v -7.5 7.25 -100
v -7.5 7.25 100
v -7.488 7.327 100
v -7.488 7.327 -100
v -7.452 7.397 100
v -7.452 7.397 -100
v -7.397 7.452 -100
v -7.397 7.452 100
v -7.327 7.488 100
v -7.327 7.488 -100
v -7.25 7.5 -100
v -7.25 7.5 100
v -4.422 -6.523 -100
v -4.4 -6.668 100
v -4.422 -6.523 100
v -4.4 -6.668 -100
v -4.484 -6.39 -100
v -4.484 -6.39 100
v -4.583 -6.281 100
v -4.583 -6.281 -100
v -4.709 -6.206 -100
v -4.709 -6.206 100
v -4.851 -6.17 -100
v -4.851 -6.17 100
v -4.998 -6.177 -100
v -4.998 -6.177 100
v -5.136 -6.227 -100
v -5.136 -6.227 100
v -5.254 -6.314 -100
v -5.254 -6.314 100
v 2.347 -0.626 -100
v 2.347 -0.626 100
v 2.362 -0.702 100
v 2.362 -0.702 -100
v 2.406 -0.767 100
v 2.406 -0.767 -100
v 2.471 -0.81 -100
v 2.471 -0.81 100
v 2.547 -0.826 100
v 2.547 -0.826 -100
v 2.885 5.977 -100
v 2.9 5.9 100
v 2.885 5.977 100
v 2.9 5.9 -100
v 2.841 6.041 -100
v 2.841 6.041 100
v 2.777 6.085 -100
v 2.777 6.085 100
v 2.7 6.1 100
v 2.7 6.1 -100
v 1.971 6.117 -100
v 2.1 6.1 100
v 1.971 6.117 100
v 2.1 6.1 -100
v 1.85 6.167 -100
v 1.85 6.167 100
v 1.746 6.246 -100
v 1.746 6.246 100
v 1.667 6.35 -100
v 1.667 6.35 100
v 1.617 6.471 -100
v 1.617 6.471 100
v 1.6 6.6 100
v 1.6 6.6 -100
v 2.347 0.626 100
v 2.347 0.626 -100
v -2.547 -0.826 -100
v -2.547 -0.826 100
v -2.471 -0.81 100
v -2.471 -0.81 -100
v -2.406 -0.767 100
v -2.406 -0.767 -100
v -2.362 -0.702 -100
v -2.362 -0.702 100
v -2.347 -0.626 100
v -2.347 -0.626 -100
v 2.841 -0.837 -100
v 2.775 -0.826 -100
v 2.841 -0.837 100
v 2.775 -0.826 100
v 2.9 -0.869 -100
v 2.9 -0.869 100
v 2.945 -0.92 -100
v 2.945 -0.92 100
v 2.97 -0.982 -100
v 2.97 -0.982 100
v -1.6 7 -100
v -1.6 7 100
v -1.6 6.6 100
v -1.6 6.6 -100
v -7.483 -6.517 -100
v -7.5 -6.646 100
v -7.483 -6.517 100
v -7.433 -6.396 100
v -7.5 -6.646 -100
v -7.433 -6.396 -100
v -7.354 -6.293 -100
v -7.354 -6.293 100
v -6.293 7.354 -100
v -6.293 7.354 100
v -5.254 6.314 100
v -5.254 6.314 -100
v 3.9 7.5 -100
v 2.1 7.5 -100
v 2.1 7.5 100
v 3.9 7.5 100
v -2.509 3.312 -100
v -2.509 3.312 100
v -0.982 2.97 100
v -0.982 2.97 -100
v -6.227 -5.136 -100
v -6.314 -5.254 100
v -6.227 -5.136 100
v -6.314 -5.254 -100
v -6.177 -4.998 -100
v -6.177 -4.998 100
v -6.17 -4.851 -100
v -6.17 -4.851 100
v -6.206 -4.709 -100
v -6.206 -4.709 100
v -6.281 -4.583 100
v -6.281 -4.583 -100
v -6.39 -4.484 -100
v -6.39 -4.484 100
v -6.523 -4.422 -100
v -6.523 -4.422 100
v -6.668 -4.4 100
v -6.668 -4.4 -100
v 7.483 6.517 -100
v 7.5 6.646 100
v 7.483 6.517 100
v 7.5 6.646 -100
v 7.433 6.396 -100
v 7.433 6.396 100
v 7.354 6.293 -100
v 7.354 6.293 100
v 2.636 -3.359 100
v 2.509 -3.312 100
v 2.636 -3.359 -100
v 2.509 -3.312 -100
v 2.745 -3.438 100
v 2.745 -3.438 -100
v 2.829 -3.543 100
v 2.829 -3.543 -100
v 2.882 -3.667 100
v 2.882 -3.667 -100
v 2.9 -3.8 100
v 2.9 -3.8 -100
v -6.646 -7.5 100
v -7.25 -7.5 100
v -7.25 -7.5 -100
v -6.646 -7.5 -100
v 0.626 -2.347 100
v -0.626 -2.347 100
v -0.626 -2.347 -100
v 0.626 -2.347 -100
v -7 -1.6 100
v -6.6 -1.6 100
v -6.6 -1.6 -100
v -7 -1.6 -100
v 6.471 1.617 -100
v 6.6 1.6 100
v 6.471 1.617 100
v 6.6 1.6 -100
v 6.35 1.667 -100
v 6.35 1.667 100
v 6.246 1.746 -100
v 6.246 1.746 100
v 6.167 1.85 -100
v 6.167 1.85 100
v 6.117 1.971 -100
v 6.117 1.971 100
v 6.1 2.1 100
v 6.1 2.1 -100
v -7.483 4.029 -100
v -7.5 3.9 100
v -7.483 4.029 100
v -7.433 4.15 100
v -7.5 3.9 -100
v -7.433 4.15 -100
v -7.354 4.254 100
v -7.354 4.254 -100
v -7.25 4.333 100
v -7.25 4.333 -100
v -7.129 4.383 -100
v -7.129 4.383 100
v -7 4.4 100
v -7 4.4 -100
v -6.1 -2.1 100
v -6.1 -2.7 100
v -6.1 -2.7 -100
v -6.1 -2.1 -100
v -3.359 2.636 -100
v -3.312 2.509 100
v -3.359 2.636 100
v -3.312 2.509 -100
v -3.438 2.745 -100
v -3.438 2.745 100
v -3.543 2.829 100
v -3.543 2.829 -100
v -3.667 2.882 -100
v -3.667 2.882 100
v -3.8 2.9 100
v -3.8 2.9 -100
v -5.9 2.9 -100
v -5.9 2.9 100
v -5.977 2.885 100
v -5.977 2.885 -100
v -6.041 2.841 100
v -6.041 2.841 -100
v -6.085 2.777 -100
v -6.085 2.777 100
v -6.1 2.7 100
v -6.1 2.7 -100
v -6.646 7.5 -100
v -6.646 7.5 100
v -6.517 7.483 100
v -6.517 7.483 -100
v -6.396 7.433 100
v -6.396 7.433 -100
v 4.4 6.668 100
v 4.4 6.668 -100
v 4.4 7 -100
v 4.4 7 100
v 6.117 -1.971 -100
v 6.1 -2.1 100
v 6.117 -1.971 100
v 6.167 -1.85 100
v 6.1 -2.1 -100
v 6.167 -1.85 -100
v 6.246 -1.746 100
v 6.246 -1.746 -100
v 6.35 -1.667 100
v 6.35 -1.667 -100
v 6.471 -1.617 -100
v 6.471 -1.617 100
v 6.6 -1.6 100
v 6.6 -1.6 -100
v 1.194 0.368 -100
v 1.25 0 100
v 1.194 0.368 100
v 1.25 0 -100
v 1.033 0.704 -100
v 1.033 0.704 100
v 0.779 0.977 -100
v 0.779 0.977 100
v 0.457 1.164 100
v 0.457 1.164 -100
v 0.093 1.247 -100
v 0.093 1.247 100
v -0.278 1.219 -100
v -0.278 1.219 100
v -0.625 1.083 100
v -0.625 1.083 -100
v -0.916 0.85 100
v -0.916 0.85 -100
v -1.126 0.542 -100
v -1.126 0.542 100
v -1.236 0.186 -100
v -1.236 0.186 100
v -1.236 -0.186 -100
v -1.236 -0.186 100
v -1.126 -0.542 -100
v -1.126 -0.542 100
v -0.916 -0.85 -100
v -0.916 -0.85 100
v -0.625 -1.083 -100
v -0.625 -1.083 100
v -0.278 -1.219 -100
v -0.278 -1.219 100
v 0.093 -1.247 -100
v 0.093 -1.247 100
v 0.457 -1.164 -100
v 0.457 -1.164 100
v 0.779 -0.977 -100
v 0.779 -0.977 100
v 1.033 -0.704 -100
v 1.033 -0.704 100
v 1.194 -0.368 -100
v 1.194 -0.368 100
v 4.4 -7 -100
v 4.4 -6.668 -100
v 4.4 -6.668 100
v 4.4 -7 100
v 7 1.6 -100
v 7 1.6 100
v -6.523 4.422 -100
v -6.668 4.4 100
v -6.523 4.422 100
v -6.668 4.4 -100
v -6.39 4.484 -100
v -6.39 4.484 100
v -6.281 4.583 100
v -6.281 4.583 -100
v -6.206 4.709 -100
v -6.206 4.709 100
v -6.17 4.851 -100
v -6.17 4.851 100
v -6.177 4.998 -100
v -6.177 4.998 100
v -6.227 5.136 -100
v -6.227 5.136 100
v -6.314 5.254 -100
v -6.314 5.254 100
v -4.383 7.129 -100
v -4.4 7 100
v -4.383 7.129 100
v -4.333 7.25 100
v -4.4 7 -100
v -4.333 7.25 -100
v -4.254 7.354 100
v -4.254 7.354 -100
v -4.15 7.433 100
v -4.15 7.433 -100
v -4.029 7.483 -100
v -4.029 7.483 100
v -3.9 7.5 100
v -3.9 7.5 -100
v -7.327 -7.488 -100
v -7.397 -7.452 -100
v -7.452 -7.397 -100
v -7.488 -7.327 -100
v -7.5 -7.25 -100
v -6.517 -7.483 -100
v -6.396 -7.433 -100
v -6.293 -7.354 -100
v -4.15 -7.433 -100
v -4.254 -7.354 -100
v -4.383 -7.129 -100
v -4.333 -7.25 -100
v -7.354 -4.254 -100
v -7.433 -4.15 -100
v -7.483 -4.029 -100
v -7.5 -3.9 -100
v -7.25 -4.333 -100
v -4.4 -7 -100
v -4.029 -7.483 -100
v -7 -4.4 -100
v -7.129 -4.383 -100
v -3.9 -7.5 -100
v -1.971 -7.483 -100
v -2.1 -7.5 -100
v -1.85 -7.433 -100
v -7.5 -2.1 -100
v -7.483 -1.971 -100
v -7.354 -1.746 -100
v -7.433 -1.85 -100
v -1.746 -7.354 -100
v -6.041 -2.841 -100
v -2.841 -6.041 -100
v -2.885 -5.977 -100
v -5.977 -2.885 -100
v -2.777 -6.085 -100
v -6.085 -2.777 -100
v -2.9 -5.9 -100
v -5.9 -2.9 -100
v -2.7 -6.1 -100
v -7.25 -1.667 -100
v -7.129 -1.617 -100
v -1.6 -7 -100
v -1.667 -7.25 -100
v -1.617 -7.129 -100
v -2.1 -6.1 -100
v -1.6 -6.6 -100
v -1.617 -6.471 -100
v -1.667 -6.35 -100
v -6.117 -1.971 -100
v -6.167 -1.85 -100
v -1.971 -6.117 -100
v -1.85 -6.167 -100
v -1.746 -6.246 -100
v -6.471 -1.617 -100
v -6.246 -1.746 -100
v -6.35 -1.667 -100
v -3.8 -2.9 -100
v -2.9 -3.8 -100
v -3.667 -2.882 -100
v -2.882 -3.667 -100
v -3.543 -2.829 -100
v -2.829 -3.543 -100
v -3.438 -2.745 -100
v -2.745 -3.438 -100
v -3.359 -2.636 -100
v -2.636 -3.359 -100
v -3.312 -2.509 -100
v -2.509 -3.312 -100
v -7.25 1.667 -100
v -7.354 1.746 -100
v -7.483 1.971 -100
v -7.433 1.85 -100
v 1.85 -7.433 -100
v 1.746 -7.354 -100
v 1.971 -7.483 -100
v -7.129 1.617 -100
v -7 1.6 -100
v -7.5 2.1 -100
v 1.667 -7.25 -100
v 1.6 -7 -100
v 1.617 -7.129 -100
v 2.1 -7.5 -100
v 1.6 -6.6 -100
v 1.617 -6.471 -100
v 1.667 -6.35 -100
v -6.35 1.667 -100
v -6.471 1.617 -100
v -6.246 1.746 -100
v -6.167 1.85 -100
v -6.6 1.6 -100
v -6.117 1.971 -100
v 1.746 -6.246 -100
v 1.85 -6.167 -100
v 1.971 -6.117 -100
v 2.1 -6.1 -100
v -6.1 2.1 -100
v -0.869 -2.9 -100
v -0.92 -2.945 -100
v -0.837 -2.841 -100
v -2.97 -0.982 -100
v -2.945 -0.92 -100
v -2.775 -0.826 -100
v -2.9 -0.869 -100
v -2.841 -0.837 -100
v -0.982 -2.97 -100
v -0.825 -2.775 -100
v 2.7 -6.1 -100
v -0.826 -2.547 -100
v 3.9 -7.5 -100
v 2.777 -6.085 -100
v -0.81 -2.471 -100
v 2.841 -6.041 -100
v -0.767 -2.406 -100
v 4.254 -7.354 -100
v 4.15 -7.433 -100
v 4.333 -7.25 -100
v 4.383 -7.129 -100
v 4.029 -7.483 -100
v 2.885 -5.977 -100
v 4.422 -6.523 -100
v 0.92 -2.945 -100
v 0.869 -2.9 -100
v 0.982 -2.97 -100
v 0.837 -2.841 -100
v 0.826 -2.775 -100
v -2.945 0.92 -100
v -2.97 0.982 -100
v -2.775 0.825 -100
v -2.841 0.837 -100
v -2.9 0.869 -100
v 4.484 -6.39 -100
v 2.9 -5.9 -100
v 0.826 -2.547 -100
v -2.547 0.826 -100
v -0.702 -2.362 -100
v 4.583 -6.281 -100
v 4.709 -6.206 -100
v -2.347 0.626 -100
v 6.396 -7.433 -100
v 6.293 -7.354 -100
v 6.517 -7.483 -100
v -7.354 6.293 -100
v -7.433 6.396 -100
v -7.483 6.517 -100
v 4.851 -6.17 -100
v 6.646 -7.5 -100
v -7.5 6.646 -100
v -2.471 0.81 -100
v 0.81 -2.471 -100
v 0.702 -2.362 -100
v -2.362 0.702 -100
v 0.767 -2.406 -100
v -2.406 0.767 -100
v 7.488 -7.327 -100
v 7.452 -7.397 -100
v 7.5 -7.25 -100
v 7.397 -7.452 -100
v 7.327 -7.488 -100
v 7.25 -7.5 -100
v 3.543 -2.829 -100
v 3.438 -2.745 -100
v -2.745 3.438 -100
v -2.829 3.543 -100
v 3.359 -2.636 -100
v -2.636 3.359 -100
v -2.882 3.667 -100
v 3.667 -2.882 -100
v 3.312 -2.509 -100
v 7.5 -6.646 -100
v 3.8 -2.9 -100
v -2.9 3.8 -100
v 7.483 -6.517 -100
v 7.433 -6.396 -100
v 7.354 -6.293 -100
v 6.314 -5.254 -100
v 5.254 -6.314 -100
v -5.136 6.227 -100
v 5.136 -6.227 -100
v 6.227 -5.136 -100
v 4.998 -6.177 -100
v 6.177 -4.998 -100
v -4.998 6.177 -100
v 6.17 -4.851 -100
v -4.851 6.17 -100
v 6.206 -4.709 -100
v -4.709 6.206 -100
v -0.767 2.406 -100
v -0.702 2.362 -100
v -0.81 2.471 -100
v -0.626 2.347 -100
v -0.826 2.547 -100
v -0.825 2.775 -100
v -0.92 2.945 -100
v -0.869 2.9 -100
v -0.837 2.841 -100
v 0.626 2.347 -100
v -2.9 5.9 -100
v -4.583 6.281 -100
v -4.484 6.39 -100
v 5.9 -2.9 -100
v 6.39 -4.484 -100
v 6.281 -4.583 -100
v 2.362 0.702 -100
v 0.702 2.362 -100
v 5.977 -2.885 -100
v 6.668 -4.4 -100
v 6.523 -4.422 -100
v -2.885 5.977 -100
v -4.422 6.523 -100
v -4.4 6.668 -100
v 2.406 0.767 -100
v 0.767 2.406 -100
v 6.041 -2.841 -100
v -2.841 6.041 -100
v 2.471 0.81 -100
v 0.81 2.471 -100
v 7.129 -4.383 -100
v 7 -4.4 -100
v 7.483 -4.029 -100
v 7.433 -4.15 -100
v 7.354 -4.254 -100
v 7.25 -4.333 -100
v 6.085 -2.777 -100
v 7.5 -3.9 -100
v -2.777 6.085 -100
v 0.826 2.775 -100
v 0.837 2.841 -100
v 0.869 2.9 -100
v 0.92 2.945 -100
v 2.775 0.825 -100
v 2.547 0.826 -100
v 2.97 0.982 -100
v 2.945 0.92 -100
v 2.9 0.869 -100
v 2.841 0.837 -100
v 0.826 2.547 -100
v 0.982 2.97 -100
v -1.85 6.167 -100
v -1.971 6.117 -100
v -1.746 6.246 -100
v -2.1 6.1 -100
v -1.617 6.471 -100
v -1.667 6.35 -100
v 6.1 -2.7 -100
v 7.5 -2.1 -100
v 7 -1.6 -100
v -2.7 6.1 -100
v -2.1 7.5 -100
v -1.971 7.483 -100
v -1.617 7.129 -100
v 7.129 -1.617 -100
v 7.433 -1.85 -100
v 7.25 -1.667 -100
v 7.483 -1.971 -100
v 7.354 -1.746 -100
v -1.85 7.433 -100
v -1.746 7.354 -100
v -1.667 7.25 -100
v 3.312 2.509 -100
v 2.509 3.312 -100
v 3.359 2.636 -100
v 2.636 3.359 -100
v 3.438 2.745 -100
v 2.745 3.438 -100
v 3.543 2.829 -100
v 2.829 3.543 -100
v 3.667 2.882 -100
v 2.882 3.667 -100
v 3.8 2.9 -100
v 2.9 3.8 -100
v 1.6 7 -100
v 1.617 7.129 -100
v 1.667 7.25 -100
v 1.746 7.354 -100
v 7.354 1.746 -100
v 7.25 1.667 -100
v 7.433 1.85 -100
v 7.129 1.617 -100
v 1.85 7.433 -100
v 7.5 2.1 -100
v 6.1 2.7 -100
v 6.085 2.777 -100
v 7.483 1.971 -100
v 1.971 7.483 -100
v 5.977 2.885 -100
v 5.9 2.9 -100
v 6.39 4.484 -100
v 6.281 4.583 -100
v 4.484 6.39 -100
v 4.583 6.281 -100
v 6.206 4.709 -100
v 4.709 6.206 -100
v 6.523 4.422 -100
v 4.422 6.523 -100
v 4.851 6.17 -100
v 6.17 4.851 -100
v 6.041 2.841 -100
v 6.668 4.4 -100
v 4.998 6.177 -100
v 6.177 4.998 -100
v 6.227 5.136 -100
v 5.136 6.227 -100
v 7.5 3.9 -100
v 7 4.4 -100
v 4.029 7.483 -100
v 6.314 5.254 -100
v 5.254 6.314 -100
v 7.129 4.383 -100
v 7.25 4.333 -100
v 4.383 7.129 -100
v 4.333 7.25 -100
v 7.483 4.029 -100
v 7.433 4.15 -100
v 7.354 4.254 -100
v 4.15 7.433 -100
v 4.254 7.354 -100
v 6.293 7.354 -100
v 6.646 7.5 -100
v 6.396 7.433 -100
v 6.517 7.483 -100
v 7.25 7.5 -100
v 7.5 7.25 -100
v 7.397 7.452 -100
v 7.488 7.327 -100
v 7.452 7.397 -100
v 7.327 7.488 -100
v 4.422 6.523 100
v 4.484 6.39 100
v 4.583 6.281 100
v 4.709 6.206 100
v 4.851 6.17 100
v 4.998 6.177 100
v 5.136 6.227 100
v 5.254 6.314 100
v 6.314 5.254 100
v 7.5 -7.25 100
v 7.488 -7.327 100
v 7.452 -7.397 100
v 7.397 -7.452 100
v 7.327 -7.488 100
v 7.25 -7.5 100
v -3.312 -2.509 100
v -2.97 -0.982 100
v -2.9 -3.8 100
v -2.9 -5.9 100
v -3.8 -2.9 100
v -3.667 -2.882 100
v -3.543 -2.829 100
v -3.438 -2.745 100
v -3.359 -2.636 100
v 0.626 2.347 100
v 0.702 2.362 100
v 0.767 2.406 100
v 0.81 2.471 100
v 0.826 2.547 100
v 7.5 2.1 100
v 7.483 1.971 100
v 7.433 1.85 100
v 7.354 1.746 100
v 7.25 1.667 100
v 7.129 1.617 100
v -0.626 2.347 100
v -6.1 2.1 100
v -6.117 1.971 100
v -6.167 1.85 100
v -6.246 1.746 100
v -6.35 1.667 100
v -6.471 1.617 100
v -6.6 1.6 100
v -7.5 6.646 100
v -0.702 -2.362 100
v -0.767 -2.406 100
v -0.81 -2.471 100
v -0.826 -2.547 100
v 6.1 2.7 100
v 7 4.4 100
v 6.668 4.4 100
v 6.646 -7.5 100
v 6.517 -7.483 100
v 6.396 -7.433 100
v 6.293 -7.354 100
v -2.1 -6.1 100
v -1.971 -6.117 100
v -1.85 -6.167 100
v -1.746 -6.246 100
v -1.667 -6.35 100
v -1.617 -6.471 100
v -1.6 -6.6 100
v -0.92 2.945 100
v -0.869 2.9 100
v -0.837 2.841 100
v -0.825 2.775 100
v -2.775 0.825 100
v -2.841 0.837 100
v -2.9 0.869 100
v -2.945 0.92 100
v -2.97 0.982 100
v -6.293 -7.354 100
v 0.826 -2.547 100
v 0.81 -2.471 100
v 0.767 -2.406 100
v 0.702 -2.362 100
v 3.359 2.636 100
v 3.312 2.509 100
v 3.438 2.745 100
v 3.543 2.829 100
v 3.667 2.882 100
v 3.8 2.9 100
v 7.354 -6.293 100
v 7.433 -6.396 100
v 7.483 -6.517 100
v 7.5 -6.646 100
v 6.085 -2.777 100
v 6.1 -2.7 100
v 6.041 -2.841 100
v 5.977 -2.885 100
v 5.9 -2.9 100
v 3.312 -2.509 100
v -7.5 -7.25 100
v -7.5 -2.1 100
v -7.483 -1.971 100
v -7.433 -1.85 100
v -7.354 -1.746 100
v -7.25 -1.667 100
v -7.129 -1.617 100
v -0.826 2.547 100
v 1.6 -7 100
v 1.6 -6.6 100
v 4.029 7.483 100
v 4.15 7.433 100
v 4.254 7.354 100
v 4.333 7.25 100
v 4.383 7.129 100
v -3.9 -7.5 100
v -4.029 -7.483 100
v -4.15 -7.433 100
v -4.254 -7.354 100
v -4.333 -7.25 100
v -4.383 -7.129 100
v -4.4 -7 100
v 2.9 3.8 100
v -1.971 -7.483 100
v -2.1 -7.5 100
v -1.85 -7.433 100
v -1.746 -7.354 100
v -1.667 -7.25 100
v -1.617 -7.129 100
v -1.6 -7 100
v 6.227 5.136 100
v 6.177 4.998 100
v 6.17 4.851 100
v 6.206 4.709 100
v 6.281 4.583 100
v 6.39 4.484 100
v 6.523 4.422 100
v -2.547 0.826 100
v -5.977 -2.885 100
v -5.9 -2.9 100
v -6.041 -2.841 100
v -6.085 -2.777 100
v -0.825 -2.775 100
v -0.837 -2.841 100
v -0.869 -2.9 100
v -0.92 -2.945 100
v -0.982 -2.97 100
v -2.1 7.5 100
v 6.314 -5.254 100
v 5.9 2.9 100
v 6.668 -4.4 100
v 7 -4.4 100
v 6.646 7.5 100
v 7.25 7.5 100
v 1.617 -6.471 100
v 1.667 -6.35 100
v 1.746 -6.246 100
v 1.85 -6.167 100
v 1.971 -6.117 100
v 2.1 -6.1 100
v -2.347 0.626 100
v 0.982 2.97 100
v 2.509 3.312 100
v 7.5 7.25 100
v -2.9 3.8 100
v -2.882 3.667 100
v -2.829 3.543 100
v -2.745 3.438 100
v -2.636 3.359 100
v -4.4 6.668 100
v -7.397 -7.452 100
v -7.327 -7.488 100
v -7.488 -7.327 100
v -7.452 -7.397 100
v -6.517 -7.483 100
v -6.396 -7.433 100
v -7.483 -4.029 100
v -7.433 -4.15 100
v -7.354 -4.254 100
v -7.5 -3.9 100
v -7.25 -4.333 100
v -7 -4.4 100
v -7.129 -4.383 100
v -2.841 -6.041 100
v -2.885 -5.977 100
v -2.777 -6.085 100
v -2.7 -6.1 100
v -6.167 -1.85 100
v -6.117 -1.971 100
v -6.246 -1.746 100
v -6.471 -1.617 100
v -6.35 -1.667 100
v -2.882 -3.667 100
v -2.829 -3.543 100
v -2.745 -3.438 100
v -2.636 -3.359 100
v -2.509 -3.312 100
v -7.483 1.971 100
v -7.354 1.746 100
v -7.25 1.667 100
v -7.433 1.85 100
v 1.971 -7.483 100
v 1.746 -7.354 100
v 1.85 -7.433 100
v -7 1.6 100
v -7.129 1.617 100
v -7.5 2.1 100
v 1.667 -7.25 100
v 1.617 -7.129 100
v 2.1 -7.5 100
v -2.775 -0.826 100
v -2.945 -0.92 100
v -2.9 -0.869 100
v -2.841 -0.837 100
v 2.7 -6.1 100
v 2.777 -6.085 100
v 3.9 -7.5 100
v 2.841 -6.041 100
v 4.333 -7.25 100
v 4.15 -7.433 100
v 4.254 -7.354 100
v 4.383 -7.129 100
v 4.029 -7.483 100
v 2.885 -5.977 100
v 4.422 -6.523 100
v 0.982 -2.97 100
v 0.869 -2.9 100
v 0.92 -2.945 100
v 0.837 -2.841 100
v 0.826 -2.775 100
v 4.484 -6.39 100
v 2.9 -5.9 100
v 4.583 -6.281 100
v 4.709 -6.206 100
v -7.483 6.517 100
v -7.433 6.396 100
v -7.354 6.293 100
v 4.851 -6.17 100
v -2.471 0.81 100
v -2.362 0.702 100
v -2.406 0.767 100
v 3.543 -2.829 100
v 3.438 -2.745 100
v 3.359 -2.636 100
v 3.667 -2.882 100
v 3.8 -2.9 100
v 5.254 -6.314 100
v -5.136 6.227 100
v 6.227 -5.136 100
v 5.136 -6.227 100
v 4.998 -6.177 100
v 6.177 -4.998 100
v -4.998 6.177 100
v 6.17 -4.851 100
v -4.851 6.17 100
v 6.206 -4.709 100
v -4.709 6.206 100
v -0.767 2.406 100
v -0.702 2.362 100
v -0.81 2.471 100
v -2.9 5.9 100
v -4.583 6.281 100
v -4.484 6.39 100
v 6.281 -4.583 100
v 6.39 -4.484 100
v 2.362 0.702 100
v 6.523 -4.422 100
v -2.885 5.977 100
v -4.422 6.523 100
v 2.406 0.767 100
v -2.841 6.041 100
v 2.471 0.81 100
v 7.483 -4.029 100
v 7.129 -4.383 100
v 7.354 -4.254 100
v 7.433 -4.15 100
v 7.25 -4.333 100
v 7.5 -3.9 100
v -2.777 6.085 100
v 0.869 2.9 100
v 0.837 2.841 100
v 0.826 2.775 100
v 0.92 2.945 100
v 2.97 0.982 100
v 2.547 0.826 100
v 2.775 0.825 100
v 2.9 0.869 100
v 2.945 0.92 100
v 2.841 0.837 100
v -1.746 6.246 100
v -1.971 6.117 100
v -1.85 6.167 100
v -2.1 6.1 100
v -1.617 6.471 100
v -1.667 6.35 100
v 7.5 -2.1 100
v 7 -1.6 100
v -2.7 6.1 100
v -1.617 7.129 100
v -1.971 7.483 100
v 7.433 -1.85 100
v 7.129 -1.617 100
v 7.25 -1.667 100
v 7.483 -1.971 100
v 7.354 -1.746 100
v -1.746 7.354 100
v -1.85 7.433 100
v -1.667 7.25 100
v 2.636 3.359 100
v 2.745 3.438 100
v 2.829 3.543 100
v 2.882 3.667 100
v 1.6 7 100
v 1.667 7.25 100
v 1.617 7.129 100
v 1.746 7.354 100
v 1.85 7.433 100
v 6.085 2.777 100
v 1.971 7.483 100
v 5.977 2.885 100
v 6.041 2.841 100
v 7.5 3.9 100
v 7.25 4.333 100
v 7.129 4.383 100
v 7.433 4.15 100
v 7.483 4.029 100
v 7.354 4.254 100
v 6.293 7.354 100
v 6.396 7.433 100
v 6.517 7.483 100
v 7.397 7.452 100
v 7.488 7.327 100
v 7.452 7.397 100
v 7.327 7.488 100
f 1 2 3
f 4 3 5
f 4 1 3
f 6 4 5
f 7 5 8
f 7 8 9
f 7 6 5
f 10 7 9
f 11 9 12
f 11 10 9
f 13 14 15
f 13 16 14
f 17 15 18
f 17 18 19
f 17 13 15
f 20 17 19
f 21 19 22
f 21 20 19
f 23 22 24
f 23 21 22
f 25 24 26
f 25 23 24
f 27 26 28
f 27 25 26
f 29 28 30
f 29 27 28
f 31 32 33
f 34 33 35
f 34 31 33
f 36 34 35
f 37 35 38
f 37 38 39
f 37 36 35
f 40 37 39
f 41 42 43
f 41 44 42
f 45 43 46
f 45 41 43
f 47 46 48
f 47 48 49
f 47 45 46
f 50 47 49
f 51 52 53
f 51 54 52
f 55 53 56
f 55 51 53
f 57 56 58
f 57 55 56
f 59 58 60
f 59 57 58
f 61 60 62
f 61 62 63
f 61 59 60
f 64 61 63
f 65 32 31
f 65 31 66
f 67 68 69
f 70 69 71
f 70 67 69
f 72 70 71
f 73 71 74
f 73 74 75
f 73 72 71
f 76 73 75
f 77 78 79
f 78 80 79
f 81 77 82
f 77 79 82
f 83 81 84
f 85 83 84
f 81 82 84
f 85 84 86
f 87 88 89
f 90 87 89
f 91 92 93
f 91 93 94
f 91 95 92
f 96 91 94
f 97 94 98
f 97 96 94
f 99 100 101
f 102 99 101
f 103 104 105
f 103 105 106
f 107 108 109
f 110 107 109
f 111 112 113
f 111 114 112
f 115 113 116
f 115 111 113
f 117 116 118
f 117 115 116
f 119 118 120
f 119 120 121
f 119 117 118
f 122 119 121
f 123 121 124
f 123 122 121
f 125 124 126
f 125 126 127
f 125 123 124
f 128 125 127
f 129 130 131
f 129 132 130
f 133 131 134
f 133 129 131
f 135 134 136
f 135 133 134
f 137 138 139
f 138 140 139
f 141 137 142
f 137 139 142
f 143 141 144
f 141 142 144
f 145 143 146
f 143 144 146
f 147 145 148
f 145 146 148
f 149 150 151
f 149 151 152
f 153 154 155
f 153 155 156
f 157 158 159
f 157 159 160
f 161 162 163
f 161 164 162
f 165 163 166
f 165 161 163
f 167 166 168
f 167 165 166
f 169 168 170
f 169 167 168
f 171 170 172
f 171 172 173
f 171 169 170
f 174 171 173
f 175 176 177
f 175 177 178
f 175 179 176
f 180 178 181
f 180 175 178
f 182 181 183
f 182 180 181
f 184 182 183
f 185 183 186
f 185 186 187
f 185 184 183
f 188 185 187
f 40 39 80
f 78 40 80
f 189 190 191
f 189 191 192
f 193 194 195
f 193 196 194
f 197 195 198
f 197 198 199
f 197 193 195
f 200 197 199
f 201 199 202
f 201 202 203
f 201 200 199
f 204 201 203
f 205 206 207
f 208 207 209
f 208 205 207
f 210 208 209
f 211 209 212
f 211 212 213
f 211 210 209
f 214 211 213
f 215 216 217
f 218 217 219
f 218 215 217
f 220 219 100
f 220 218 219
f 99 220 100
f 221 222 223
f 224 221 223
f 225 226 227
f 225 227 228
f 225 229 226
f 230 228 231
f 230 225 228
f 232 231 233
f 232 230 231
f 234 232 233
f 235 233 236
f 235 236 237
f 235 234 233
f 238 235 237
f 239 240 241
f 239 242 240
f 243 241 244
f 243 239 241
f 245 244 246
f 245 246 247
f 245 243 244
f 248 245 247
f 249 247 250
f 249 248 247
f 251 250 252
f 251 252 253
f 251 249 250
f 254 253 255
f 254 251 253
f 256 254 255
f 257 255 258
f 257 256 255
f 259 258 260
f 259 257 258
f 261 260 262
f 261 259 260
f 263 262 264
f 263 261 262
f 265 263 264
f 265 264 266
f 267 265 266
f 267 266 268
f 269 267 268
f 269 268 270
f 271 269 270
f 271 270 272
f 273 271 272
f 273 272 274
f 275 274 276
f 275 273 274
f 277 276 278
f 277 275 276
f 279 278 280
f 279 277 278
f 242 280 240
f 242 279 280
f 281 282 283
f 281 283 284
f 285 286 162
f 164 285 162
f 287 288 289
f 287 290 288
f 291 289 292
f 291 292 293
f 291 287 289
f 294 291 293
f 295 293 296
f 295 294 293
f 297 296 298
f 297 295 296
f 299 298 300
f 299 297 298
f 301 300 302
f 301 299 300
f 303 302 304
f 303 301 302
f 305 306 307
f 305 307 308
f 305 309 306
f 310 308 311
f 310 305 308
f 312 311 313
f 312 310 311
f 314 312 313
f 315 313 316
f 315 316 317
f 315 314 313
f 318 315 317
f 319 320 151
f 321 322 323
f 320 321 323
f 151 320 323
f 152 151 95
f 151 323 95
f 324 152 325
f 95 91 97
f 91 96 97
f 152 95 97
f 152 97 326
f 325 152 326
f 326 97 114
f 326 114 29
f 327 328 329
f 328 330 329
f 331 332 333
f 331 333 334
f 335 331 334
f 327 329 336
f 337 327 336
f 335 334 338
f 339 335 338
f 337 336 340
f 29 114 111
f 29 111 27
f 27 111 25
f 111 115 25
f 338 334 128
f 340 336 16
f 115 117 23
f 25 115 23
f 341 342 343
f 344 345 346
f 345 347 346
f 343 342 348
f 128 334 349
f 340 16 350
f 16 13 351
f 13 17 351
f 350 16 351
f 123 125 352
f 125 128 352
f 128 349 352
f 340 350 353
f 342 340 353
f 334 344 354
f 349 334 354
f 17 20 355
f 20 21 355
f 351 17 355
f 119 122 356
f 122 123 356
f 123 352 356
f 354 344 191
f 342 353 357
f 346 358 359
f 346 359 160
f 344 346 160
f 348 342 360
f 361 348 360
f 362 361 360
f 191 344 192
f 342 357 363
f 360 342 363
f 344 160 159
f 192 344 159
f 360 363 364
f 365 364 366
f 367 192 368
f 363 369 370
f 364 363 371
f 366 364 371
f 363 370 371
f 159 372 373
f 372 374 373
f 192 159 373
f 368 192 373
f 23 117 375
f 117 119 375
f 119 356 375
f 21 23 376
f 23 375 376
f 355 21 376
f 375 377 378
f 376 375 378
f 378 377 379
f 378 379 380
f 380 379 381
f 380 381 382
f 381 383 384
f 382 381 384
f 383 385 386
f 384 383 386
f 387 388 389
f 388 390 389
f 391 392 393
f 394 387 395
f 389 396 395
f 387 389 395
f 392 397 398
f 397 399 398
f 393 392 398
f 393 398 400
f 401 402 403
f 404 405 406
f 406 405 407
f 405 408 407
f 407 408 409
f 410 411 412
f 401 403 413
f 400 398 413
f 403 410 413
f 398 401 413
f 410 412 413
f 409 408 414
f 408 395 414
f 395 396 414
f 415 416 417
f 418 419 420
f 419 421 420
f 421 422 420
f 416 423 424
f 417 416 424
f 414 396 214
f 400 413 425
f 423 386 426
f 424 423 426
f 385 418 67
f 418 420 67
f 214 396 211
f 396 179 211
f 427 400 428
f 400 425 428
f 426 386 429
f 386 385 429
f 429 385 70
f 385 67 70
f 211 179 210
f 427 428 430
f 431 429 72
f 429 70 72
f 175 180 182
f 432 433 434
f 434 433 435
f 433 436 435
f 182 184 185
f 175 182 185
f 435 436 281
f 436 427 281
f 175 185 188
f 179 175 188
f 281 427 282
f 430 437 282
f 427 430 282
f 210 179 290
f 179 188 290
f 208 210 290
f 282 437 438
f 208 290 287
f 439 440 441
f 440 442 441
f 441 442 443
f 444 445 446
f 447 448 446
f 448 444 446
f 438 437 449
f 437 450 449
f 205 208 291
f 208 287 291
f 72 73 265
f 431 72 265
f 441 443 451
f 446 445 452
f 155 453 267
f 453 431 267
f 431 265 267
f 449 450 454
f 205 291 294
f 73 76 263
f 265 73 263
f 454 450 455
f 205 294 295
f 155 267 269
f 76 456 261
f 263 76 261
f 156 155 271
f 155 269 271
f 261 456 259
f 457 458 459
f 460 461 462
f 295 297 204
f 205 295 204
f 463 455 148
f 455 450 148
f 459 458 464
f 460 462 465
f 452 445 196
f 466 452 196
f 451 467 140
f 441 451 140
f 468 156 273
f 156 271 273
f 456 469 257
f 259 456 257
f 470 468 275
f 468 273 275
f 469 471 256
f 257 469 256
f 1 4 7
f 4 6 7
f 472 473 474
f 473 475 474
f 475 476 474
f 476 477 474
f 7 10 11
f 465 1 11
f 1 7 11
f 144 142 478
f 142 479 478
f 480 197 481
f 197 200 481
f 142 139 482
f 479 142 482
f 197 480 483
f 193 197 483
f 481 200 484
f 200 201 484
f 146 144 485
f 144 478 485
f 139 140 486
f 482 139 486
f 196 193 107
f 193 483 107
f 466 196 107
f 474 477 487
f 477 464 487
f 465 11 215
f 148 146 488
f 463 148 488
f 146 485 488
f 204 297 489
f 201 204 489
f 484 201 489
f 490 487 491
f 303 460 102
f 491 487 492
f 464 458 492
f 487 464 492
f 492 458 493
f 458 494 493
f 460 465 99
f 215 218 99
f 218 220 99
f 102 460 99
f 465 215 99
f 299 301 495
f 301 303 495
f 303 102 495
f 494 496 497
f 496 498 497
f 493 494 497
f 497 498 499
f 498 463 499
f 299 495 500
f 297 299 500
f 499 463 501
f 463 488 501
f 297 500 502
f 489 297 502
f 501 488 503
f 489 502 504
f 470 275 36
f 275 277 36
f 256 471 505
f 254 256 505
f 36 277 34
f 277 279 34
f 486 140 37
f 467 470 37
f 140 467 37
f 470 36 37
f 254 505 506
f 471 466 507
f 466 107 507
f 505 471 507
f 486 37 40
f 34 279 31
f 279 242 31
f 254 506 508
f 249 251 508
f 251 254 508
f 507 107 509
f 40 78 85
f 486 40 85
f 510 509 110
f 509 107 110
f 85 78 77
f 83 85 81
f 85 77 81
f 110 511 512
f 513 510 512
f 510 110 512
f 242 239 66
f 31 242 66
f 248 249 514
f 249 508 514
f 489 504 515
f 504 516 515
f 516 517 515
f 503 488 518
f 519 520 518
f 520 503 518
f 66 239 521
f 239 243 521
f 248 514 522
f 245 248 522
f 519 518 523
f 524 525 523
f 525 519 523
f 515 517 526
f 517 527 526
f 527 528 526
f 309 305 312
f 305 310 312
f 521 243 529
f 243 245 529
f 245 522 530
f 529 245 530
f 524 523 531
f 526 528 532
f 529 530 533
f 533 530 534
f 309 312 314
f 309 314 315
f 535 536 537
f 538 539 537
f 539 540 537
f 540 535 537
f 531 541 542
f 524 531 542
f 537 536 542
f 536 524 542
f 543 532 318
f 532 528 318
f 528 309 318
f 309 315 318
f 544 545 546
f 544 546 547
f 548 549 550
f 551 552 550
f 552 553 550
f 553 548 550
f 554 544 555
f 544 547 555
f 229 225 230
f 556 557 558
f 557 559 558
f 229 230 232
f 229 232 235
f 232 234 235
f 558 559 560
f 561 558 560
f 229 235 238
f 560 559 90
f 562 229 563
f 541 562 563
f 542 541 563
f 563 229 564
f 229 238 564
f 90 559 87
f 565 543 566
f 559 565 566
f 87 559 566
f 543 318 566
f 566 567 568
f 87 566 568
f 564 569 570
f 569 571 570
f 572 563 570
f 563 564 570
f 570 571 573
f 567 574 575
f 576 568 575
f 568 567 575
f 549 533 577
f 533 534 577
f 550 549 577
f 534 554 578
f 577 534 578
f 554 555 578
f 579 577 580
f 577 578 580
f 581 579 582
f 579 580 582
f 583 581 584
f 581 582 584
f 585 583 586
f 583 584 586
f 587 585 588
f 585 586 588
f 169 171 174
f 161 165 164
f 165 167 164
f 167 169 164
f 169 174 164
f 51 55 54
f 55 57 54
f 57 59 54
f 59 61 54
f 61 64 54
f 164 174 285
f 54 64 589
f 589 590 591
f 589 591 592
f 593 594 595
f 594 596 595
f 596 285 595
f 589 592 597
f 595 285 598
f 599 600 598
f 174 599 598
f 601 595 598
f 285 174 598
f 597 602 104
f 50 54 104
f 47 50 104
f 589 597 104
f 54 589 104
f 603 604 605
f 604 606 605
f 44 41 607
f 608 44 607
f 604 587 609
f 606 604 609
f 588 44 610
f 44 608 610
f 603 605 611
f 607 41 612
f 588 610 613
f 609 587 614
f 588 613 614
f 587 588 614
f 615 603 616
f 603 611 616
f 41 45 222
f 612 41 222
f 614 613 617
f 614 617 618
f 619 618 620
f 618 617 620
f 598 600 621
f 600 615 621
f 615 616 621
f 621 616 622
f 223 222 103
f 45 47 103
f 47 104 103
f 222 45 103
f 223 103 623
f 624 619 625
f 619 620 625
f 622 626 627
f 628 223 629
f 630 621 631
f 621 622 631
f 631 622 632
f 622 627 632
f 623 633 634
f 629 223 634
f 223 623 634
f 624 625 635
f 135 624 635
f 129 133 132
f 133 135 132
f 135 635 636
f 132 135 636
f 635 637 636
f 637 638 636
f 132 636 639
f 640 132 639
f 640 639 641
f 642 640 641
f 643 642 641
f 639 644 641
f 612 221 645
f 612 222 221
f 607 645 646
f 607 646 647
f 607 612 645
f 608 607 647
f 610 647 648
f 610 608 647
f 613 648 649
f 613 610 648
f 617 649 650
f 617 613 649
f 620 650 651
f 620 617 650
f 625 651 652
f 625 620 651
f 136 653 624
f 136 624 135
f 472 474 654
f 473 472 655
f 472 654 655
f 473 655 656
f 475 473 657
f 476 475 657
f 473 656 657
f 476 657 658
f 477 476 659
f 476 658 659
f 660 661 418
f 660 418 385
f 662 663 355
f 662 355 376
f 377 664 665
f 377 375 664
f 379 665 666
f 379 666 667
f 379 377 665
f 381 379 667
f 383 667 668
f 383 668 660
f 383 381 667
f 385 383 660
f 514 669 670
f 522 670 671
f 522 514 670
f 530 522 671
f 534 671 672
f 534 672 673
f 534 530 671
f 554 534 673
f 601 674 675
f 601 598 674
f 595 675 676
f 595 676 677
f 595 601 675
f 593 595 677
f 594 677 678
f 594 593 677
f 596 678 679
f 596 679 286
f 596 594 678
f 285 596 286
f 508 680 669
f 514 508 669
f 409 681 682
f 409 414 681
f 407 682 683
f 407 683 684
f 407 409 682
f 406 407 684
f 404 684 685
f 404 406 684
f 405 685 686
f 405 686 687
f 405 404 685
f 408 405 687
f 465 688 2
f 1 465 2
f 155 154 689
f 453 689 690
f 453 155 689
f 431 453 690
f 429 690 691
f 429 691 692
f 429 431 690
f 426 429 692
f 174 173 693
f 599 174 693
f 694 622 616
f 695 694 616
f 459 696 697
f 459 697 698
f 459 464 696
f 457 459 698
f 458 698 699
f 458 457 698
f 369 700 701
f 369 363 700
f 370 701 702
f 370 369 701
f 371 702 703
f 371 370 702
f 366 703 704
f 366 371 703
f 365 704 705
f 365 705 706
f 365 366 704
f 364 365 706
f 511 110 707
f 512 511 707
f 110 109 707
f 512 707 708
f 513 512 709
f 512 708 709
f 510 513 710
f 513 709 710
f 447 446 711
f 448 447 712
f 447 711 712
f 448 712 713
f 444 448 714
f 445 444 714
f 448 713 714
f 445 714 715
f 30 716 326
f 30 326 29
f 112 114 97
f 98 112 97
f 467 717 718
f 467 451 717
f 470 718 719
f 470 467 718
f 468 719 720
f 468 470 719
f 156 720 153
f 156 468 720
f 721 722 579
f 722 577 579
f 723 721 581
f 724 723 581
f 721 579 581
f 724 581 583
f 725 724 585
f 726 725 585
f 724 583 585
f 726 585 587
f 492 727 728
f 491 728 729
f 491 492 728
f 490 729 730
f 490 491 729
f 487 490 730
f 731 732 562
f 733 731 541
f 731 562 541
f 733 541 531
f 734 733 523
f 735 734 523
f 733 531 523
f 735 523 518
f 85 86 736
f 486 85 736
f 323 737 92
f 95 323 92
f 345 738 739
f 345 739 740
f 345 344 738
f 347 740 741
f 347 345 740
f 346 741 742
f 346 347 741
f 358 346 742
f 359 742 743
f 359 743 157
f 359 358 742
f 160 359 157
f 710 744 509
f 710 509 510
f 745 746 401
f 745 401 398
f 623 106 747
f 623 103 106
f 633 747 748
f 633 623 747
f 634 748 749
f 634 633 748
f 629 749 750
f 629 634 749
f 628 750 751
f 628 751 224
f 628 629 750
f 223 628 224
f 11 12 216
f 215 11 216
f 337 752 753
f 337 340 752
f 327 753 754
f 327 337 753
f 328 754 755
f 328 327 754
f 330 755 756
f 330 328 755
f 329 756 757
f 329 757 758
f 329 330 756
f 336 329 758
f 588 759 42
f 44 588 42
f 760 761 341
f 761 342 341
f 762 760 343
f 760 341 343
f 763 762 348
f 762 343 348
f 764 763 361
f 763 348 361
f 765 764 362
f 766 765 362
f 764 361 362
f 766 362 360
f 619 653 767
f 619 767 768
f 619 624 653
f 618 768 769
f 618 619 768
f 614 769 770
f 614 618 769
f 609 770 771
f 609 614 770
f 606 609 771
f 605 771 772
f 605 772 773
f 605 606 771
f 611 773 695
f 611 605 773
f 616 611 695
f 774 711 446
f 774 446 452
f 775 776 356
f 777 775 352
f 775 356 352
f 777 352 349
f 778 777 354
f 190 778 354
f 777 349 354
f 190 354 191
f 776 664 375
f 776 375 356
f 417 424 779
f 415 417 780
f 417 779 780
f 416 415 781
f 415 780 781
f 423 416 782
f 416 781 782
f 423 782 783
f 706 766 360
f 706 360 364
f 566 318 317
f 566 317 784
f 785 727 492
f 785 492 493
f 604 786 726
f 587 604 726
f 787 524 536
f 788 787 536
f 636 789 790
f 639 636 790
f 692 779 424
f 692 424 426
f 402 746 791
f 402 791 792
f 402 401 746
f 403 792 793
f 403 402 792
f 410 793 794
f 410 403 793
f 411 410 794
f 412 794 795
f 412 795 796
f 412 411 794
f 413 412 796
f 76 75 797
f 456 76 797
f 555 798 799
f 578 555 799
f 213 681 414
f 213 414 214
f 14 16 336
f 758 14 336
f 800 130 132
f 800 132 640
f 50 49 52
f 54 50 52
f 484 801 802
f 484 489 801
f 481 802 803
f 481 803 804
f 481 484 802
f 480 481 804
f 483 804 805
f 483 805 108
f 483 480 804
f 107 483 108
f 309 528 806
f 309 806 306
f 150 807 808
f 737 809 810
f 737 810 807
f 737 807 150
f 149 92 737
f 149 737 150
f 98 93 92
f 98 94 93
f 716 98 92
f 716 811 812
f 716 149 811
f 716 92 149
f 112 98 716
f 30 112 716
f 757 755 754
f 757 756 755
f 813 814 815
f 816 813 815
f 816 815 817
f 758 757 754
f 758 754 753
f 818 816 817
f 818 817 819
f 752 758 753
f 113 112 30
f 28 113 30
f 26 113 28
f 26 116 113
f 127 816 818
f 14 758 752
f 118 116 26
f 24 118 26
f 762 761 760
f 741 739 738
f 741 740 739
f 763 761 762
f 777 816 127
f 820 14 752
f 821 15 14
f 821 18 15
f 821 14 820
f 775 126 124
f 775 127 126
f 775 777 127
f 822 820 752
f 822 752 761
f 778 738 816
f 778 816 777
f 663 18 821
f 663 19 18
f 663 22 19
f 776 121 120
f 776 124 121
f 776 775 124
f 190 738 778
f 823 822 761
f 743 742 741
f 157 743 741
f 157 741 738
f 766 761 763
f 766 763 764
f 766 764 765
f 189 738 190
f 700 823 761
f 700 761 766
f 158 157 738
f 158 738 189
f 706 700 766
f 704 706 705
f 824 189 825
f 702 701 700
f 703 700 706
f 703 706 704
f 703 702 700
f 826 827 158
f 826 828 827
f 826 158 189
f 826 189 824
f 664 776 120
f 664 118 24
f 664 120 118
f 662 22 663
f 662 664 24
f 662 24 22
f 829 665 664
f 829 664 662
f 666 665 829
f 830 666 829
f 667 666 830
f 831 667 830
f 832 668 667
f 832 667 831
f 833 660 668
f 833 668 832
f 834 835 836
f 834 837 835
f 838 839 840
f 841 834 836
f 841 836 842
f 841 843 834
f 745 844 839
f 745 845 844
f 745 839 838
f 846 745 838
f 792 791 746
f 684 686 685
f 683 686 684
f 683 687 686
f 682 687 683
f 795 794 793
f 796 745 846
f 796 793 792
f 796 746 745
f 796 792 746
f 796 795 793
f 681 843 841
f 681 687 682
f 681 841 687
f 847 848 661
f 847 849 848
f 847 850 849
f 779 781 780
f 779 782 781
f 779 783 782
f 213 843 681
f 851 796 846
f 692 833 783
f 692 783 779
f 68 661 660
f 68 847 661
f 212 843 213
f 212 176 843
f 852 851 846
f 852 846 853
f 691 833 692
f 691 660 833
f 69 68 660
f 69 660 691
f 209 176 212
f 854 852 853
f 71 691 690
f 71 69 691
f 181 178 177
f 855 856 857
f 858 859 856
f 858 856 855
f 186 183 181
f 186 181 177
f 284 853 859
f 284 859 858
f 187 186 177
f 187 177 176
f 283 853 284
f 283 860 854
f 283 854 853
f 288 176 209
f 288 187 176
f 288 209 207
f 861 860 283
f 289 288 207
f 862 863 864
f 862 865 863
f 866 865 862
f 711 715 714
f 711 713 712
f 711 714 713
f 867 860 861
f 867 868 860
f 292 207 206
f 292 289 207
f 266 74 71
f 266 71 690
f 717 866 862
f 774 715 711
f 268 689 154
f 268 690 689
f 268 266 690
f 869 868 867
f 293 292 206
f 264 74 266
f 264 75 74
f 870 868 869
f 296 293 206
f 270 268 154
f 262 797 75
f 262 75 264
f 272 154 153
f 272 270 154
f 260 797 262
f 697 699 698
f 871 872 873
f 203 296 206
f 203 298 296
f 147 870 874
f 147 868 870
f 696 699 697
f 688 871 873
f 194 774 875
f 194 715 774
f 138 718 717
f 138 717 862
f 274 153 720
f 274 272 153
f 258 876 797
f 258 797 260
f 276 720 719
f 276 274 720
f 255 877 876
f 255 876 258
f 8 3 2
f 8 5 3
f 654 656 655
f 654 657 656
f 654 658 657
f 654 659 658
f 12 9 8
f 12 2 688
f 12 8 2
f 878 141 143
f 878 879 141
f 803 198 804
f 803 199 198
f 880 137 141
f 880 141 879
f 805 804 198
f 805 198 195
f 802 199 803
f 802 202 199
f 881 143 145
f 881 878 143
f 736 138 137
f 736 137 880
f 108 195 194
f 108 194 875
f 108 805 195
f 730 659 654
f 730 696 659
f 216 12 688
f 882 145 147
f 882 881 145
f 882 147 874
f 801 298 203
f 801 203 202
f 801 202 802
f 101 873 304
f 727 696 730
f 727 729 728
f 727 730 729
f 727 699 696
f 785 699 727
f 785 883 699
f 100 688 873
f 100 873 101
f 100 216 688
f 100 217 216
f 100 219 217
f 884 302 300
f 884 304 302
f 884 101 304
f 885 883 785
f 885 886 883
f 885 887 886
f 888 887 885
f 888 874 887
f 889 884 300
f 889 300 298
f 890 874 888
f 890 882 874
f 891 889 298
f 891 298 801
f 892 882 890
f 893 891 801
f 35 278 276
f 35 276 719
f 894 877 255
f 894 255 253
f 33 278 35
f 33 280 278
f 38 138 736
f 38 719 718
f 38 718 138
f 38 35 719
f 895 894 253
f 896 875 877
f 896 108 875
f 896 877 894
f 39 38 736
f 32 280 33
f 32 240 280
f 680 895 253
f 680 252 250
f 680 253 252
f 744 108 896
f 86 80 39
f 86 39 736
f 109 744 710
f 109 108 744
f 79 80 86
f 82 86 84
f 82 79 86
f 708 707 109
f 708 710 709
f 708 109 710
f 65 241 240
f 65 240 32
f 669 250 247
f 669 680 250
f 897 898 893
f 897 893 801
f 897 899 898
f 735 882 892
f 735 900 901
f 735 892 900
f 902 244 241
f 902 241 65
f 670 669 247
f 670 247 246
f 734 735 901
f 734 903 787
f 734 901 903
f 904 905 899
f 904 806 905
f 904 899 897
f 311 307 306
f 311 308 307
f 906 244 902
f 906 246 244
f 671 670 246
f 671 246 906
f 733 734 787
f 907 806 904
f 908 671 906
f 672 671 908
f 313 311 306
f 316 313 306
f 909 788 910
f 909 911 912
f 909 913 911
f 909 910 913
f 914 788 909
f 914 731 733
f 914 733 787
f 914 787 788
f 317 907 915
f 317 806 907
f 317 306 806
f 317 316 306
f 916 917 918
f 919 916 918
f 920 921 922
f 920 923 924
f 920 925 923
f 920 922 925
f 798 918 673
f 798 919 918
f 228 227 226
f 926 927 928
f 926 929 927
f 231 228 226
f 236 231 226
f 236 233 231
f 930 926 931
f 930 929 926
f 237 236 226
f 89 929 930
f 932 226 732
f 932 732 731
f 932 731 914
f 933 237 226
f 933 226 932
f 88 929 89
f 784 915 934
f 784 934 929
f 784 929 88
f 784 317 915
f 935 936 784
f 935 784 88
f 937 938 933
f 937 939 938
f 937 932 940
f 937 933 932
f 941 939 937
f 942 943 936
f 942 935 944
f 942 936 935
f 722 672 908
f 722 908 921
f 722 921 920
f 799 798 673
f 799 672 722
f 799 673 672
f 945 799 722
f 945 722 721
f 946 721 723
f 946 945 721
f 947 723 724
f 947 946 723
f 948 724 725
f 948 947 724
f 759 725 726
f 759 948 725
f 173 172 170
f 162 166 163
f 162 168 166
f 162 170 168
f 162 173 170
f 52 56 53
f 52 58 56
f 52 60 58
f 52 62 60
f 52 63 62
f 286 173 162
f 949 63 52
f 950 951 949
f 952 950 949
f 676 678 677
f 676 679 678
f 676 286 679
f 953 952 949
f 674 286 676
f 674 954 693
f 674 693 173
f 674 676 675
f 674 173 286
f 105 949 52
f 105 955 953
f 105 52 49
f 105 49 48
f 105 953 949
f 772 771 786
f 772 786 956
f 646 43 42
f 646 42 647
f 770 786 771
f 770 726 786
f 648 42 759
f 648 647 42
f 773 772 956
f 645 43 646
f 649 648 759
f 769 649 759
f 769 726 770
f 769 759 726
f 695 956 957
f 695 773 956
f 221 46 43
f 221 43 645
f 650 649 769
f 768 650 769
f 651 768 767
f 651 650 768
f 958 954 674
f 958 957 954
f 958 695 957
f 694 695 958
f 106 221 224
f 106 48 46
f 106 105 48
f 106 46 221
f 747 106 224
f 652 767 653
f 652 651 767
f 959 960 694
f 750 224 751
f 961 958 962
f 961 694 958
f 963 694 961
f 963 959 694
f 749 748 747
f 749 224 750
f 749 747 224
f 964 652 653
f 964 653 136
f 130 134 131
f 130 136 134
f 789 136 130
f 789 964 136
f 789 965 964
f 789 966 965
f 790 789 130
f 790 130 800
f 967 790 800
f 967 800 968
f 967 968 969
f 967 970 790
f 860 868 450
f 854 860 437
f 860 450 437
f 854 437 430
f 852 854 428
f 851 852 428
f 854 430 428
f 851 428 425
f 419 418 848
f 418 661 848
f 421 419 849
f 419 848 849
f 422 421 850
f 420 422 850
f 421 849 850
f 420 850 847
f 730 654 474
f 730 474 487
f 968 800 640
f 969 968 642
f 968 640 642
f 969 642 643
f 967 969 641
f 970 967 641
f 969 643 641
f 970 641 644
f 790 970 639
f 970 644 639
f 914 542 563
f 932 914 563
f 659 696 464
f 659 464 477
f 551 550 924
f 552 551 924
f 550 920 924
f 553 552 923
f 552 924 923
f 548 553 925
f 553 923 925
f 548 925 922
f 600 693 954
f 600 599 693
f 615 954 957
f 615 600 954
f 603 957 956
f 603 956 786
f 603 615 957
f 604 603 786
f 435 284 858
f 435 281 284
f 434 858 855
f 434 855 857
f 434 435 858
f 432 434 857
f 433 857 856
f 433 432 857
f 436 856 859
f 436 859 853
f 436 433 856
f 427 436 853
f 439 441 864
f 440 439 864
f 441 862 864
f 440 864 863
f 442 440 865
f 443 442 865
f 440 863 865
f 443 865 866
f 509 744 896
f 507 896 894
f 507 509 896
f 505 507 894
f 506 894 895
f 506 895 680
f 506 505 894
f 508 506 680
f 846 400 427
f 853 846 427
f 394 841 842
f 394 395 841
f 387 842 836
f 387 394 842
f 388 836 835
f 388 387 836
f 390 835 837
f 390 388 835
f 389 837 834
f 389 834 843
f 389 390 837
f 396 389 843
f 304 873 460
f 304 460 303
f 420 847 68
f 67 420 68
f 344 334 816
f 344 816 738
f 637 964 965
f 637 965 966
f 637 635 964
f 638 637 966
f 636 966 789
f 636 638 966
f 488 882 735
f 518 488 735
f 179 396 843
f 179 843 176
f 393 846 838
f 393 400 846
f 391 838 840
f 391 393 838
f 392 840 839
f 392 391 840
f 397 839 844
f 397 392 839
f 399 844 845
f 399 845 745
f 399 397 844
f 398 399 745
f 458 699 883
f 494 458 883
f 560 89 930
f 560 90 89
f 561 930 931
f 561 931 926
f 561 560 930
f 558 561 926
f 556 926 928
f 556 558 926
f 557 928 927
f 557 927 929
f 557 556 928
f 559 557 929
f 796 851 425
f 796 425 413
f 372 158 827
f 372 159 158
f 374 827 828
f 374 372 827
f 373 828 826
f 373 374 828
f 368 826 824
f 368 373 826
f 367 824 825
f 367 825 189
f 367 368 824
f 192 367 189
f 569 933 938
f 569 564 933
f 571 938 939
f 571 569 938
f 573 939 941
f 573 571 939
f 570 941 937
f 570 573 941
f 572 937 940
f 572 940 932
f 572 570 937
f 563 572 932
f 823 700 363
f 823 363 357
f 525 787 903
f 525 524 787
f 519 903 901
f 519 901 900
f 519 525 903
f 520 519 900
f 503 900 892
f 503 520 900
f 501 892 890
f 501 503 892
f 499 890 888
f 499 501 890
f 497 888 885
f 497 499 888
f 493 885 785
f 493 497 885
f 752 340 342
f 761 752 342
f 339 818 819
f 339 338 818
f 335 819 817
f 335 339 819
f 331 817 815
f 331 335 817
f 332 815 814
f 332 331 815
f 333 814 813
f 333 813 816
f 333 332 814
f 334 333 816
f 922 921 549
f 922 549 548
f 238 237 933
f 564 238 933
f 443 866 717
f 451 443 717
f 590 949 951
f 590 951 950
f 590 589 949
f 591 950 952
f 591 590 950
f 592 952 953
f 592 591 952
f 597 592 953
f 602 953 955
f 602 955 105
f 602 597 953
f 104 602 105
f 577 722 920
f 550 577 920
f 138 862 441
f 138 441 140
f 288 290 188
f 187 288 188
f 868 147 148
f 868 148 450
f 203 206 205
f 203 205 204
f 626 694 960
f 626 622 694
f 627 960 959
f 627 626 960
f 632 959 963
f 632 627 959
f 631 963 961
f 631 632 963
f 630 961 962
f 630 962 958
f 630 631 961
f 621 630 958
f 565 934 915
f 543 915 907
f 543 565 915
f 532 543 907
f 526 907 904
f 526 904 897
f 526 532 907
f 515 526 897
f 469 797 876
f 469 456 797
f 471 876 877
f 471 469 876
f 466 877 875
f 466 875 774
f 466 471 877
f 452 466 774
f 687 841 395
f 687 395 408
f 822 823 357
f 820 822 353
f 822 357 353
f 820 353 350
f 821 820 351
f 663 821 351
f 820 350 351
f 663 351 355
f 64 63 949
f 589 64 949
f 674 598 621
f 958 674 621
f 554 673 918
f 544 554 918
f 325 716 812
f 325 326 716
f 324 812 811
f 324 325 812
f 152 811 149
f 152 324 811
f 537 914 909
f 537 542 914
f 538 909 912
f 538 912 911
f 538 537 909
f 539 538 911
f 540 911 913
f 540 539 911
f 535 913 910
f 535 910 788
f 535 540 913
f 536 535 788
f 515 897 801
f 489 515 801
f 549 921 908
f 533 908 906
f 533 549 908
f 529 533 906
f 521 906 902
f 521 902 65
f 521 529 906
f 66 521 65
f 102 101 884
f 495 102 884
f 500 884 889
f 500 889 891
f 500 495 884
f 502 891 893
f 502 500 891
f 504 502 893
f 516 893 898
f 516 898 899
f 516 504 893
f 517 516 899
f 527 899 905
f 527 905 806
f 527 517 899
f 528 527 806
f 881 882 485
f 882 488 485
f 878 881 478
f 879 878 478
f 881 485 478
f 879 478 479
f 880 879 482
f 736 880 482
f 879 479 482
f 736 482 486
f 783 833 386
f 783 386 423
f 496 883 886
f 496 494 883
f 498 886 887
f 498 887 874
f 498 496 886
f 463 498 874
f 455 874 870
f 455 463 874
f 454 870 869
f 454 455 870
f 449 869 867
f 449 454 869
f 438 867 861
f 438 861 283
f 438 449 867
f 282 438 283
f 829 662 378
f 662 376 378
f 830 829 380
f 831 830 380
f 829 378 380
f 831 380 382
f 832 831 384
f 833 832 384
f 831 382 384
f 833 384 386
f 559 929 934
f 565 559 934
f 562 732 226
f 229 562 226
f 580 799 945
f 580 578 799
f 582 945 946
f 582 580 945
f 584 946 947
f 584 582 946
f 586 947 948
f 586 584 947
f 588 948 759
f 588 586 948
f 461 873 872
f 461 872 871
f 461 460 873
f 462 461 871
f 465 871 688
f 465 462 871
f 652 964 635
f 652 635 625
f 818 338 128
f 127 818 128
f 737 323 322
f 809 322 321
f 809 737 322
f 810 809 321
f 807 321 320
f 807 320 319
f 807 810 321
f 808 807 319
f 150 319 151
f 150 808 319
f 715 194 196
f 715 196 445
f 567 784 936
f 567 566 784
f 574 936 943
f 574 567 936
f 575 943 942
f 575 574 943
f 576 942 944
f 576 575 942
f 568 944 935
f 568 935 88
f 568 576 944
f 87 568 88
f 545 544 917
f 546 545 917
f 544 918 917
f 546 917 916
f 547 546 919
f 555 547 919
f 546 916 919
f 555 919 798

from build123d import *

# Parameters (mm, degrees)
SKETCH1_W           = 15
SKETCH1_H           = 15
SKETCH1_R           = 1.25
BOSS_EXTRUDE1_DEPTH = 100
FILLET1_R           = 0.25
CUT_EXTRUDE1_DEPTH  = 201
CUT_EXTRUDE3_DEPTH  = 201
FILLET3_R           = 0.5
FILLET4_R           = 0.5
FILLET5_R           = 3
FILLET6_R           = 0.2
CUT_EXTRUDE4_DEPTH  = 201
FILLET8_R           = 0.5
SKETCH6_W           = 5.1529354
SKETCH6_H           = 1.651
SKETCH6_W_2         = 1.651
SKETCH6_H_2         = 5.1529354
CUT_EXTRUDE5_DEPTH  = 201
FILLET10_R          = 0.2


with BuildPart() as part:
    # Sketch1 → Boss-Extrude1 (new body, symmetric)
    with BuildSketch(Plane.XY):
        Rectangle(SKETCH1_W, SKETCH1_H)
        Circle(SKETCH1_R, mode=Mode.SUBTRACT)
    extrude(amount=BOSS_EXTRUDE1_DEPTH, both=True)

    # Fillet1
    fillet1_edges = [part.edges().sort_by_distance(p)[0] for p in [
        (7.5, -7.5, 0),
        (-7.5, -7.5, 0),
        (-7.5, 7.5, 0),
        (7.5, 7.5, 0),
    ]]
    fillet(fillet1_edges, radius=FILLET1_R)

    # Sketch2 → Cut-Extrude1 (cut, through all)
    with BuildSketch(Plane.XY.offset(100)):
        Polygon((-7.5, 1.6), (-6.1, 1.6), (-6.1, 2.9), (-3.4, 2.9), (-3.4, -2.9), (-6.1, -2.9), (-6.1, -1.6), (-7.5, -1.6), align=None)
        Polygon((2.9, 6.1), (1.6, 6.1), (1.6, 7.5), (-1.6, 7.5), (-1.6, 6.1), (-2.9, 6.1), (-2.9, 3.4), (2.9, 3.4), align=None)
        Polygon((-1.6, -7.5), (-1.6, -6.1), (-2.9, -6.1), (-2.9, -3.4), (2.9, -3.4), (2.9, -6.1), (1.6, -6.1), (1.6, -7.5), align=None)
        Polygon((6.1, -2.9), (6.1, -1.6), (7.5, -1.6), (7.5, 1.6), (6.1, 1.6), (6.1, 2.9), (3.4, 2.9), (3.4, -2.9), align=None)
    extrude(amount=-CUT_EXTRUDE1_DEPTH, mode=Mode.SUBTRACT)

    # Sketch4 → Cut-Extrude3 (cut, through all)
    with BuildSketch(Plane.XY.offset(100)):
        Polygon((-3.4, 2.9), (-2.75, 0), (-3.4, -2.9), align=None)
        Polygon((-2.9, 3.4), (0, 2.75), (2.9, 3.4), align=None)
        Polygon((3.4, 2.9), (2.75, 0), (3.4, -2.9), align=None)
        Polygon((-2.9, -3.4), (0, -2.75), (2.9, -3.4), align=None)
    extrude(amount=-CUT_EXTRUDE3_DEPTH, mode=Mode.SUBTRACT)

    # Fillet3
    fillet3_edges = [part.edges().sort_by_distance(p)[0] for p in [
        (1.6, -7.5, 0),
        (-1.6, -7.5, 0),
        (-1.6, -6.1, 0),
        (1.6, -6.1, 0),
        (6.1, 1.6, 0),
        (7.5, 1.6, 0),
        (7.5, -1.6, 0),
        (6.1, -1.6, 0),
        (-7.5, -1.6, 0),
        (-7.5, 1.6, 0),
        (-6.1, 1.6, 0),
        (-6.1, -1.6, 0),
        (-1.6, 6.1, 0),
        (-1.6, 7.5, 0),
        (1.6, 7.5, 0),
        (1.6, 6.1, 0),
    ]]
    fillet(fillet3_edges, radius=FILLET3_R)

    # Fillet4
    fillet4_edges = [part.edges().sort_by_distance(p)[0] for p in [
        (-2.9, -3.4, 0),
        (2.9, -3.4, 0),
        (3.4, -2.9, 0),
        (3.4, 2.9, 0),
        (-3.4, 2.9, 0),
        (-3.4, -2.9, 0),
        (2.9, 3.4, 0),
        (-2.9, 3.4, 0),
    ]]
    fillet(fillet4_edges, radius=FILLET4_R)

    # Fillet5
    fillet5_edges = [part.edges().sort_by_distance(p)[0] for p in [
        (-2.75, 0, 0),
        (0, 2.75, 0),
        (2.75, 0, 0),
        (0, -2.75, 0),
    ]]
    fillet(fillet5_edges, radius=FILLET5_R)

    # Fillet6
    fillet6_edges = [part.edges().sort_by_distance(p)[0] for p in [
        (-2.9, -6.1, 0),
        (2.9, -6.1, 0),
        (6.1, -2.9, 0),
        (6.1, 2.9, 0),
        (-6.1, 2.9, 0),
        (-6.1, -2.9, 0),
        (2.9, 6.1, 0),
        (-2.9, 6.1, 0),
    ]]
    fillet(fillet6_edges, radius=FILLET6_R)

    # Sketch5 → Cut-Extrude4 (cut, through all)
    with BuildSketch(Plane.XY.offset(100)):
        Polygon((-7.5, 6.439339828), (-5.460660172, 4.4), (-7.5, 4.4), align=None)
        Polygon((-6.439339828, 7.5), (-4.4, 5.460660172), (-4.4, 7.5), align=None)
        Polygon((4.4, 7.5), (6.439339828, 7.5), (4.4, 5.460660172), align=None)
        Polygon((7.5, 6.439339828), (7.5, 4.4), (5.460660172, 4.4), align=None)
        Polygon((7.5, -6.439339828), (5.460660172, -4.4), (7.5, -4.4), align=None)
        Polygon((6.439339828, -7.5), (4.4, -5.460660172), (4.4, -7.5), align=None)
        Polygon((-4.4, -7.5), (-6.439339828, -7.5), (-4.4, -5.460660172), align=None)
        Polygon((-7.5, -6.439339828), (-7.5, -4.4), (-5.460660172, -4.4), align=None)
    extrude(amount=-CUT_EXTRUDE4_DEPTH, mode=Mode.SUBTRACT)

    # Fillet8
    fillet8_edges = [part.edges().sort_by_distance(p)[0] for p in [
        (-7.5, 4.4, 0),
        (-7.5, 6.439339828, 0),
        (-5.460660172, 4.4, 0),
        (7.5, -4.4, 0),
        (7.5, -6.439339828, 0),
        (5.460660172, -4.4, 0),
        (5.460660172, 4.4, 0),
        (7.5, 6.439339828, 0),
        (7.5, 4.4, 0),
        (-4.4, 7.5, 0),
        (-4.4, 5.460660172, 0),
        (-6.439339828, 7.5, 0),
        (-5.460660172, -4.4, 0),
        (-7.5, -6.439339828, 0),
        (-7.5, -4.4, 0),
        (4.4, 5.460660172, 0),
        (4.4, 7.5, 0),
        (6.439339828, 7.5, 0),
        (6.439339828, -7.5, 0),
        (4.4, -7.5, 0),
        (4.4, -5.460660172, 0),
        (-6.439339828, -7.5, 0),
        (-4.4, -5.460660172, 0),
        (-4.4, -7.5, 0),
    ]]
    fillet(fillet8_edges, radius=FILLET8_R)

    # Sketch6 → Cut-Extrude5 (cut, through all)
    with BuildSketch(Plane.XY.offset(100)):
        with Locations((4.9235323, 0)):
            Rectangle(SKETCH6_W, SKETCH6_H)
        with Locations((0, -4.9235323)):
            Rectangle(SKETCH6_W_2, SKETCH6_H_2)
        with Locations((-4.9235323, 0)):
            Rectangle(SKETCH6_W, SKETCH6_H)
        with Locations((0, 4.9235323)):
            Rectangle(SKETCH6_W_2, SKETCH6_H_2)
    extrude(amount=-CUT_EXTRUDE5_DEPTH, mode=Mode.SUBTRACT)

    # Fillet10
    fillet10_edges = [part.edges().sort_by_distance(p)[0] for p in [
        (0.8255, -2.935025862, 0),
        (-0.8255, -2.935025862, 0),
        (0.8255, -2.3470646, 0),
        (-0.8255, -2.3470646, 0),
        (2.935025862, 0.8255, 0),
        (2.935025862, -0.8255, 0),
        (2.3470646, 0.8255, 0),
        (2.3470646, -0.8255, 0),
        (-2.935025862, -0.8255, 0),
        (-2.935025862, 0.8255, 0),
        (-2.3470646, -0.8255, 0),
        (-2.3470646, 0.8255, 0),
        (-0.8255, 2.935025862, 0),
        (0.8255, 2.935025862, 0),
        (-0.8255, 2.3470646, 0),
        (0.8255, 2.3470646, 0),
    ]]
    fillet(fillet10_edges, radius=FILLET10_R)


solid = part.part
